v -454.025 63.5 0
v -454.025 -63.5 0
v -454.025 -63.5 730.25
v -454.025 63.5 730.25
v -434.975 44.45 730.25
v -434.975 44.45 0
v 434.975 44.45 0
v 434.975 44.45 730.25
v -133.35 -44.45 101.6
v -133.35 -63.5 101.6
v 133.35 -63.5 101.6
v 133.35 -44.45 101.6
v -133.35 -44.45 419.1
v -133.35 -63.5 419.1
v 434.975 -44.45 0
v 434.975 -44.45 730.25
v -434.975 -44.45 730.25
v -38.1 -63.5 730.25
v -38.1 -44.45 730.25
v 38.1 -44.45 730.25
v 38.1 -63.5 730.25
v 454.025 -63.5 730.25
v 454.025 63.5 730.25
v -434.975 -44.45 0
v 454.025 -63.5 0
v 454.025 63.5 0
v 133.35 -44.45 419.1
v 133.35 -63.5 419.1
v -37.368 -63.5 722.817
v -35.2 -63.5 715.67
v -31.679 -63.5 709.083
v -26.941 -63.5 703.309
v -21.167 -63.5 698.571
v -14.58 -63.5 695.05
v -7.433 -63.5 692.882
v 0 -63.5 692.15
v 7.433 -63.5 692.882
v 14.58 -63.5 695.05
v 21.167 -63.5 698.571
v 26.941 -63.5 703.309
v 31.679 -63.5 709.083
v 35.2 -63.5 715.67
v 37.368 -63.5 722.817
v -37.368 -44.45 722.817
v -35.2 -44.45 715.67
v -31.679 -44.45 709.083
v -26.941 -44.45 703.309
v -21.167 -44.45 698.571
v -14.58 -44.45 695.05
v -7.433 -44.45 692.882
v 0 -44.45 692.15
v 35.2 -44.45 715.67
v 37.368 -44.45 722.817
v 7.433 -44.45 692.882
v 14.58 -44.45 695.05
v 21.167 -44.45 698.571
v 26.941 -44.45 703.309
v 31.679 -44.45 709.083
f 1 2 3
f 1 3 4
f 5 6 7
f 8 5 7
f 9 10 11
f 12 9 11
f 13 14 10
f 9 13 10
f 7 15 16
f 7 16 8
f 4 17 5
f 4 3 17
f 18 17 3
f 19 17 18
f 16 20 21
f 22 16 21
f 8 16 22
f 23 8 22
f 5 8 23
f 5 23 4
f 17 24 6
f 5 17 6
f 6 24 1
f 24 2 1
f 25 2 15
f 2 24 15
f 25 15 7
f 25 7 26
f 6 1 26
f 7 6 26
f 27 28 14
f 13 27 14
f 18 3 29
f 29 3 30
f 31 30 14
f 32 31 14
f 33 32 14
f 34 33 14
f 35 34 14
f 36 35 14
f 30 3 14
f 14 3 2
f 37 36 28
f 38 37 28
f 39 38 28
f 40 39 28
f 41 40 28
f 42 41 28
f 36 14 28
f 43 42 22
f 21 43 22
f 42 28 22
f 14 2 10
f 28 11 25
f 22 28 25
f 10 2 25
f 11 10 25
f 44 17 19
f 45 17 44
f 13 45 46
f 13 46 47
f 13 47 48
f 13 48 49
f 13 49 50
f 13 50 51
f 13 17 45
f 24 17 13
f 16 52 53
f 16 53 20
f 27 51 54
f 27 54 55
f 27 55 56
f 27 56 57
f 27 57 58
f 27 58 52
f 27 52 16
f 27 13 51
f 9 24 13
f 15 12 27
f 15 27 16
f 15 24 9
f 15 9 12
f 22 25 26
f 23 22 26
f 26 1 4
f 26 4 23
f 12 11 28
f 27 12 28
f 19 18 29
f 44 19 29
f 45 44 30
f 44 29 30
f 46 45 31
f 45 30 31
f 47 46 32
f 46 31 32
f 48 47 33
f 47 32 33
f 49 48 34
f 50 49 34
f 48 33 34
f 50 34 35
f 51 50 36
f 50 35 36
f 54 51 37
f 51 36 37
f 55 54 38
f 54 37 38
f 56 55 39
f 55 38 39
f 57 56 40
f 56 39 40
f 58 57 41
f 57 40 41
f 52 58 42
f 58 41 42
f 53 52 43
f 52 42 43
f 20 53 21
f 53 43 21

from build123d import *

# Parameters (mm, degrees)
F0_W     = 908.05
F0_H     = 127
F0_W_2   = 869.95
F0_H_2   = 88.9
F1_DEPTH = 730.25
F3_DEPTH = 25.4
F4_R     = 38.1
F5_DEPTH = 25.4


with BuildPart() as f1:
    # F0 (on Top) → F1 (new body)
    with BuildSketch(Plane.XY):
        Rectangle(F0_W, F0_H)
        Rectangle(F0_W_2, F0_H_2, mode=Mode.SUBTRACT)
    extrude(amount=F1_DEPTH)

    # F2 (on face) → F3 (cut)
    with BuildSketch(Plane.XZ.offset(63.5)):
        Polygon((-133.35, 101.6), (0, 101.6), (133.35, 101.6), (133.35, 419.1), (-133.35, 419.1), align=None)
    extrude(amount=-F3_DEPTH, mode=Mode.SUBTRACT)

    # F4 (on face) → F5 (cut)
    with BuildSketch(Plane.XZ.offset(63.5)):
        with Locations((0, 730.25)):
            Circle(F4_R)
    extrude(amount=-F5_DEPTH, mode=Mode.SUBTRACT)


solid = f1.part
